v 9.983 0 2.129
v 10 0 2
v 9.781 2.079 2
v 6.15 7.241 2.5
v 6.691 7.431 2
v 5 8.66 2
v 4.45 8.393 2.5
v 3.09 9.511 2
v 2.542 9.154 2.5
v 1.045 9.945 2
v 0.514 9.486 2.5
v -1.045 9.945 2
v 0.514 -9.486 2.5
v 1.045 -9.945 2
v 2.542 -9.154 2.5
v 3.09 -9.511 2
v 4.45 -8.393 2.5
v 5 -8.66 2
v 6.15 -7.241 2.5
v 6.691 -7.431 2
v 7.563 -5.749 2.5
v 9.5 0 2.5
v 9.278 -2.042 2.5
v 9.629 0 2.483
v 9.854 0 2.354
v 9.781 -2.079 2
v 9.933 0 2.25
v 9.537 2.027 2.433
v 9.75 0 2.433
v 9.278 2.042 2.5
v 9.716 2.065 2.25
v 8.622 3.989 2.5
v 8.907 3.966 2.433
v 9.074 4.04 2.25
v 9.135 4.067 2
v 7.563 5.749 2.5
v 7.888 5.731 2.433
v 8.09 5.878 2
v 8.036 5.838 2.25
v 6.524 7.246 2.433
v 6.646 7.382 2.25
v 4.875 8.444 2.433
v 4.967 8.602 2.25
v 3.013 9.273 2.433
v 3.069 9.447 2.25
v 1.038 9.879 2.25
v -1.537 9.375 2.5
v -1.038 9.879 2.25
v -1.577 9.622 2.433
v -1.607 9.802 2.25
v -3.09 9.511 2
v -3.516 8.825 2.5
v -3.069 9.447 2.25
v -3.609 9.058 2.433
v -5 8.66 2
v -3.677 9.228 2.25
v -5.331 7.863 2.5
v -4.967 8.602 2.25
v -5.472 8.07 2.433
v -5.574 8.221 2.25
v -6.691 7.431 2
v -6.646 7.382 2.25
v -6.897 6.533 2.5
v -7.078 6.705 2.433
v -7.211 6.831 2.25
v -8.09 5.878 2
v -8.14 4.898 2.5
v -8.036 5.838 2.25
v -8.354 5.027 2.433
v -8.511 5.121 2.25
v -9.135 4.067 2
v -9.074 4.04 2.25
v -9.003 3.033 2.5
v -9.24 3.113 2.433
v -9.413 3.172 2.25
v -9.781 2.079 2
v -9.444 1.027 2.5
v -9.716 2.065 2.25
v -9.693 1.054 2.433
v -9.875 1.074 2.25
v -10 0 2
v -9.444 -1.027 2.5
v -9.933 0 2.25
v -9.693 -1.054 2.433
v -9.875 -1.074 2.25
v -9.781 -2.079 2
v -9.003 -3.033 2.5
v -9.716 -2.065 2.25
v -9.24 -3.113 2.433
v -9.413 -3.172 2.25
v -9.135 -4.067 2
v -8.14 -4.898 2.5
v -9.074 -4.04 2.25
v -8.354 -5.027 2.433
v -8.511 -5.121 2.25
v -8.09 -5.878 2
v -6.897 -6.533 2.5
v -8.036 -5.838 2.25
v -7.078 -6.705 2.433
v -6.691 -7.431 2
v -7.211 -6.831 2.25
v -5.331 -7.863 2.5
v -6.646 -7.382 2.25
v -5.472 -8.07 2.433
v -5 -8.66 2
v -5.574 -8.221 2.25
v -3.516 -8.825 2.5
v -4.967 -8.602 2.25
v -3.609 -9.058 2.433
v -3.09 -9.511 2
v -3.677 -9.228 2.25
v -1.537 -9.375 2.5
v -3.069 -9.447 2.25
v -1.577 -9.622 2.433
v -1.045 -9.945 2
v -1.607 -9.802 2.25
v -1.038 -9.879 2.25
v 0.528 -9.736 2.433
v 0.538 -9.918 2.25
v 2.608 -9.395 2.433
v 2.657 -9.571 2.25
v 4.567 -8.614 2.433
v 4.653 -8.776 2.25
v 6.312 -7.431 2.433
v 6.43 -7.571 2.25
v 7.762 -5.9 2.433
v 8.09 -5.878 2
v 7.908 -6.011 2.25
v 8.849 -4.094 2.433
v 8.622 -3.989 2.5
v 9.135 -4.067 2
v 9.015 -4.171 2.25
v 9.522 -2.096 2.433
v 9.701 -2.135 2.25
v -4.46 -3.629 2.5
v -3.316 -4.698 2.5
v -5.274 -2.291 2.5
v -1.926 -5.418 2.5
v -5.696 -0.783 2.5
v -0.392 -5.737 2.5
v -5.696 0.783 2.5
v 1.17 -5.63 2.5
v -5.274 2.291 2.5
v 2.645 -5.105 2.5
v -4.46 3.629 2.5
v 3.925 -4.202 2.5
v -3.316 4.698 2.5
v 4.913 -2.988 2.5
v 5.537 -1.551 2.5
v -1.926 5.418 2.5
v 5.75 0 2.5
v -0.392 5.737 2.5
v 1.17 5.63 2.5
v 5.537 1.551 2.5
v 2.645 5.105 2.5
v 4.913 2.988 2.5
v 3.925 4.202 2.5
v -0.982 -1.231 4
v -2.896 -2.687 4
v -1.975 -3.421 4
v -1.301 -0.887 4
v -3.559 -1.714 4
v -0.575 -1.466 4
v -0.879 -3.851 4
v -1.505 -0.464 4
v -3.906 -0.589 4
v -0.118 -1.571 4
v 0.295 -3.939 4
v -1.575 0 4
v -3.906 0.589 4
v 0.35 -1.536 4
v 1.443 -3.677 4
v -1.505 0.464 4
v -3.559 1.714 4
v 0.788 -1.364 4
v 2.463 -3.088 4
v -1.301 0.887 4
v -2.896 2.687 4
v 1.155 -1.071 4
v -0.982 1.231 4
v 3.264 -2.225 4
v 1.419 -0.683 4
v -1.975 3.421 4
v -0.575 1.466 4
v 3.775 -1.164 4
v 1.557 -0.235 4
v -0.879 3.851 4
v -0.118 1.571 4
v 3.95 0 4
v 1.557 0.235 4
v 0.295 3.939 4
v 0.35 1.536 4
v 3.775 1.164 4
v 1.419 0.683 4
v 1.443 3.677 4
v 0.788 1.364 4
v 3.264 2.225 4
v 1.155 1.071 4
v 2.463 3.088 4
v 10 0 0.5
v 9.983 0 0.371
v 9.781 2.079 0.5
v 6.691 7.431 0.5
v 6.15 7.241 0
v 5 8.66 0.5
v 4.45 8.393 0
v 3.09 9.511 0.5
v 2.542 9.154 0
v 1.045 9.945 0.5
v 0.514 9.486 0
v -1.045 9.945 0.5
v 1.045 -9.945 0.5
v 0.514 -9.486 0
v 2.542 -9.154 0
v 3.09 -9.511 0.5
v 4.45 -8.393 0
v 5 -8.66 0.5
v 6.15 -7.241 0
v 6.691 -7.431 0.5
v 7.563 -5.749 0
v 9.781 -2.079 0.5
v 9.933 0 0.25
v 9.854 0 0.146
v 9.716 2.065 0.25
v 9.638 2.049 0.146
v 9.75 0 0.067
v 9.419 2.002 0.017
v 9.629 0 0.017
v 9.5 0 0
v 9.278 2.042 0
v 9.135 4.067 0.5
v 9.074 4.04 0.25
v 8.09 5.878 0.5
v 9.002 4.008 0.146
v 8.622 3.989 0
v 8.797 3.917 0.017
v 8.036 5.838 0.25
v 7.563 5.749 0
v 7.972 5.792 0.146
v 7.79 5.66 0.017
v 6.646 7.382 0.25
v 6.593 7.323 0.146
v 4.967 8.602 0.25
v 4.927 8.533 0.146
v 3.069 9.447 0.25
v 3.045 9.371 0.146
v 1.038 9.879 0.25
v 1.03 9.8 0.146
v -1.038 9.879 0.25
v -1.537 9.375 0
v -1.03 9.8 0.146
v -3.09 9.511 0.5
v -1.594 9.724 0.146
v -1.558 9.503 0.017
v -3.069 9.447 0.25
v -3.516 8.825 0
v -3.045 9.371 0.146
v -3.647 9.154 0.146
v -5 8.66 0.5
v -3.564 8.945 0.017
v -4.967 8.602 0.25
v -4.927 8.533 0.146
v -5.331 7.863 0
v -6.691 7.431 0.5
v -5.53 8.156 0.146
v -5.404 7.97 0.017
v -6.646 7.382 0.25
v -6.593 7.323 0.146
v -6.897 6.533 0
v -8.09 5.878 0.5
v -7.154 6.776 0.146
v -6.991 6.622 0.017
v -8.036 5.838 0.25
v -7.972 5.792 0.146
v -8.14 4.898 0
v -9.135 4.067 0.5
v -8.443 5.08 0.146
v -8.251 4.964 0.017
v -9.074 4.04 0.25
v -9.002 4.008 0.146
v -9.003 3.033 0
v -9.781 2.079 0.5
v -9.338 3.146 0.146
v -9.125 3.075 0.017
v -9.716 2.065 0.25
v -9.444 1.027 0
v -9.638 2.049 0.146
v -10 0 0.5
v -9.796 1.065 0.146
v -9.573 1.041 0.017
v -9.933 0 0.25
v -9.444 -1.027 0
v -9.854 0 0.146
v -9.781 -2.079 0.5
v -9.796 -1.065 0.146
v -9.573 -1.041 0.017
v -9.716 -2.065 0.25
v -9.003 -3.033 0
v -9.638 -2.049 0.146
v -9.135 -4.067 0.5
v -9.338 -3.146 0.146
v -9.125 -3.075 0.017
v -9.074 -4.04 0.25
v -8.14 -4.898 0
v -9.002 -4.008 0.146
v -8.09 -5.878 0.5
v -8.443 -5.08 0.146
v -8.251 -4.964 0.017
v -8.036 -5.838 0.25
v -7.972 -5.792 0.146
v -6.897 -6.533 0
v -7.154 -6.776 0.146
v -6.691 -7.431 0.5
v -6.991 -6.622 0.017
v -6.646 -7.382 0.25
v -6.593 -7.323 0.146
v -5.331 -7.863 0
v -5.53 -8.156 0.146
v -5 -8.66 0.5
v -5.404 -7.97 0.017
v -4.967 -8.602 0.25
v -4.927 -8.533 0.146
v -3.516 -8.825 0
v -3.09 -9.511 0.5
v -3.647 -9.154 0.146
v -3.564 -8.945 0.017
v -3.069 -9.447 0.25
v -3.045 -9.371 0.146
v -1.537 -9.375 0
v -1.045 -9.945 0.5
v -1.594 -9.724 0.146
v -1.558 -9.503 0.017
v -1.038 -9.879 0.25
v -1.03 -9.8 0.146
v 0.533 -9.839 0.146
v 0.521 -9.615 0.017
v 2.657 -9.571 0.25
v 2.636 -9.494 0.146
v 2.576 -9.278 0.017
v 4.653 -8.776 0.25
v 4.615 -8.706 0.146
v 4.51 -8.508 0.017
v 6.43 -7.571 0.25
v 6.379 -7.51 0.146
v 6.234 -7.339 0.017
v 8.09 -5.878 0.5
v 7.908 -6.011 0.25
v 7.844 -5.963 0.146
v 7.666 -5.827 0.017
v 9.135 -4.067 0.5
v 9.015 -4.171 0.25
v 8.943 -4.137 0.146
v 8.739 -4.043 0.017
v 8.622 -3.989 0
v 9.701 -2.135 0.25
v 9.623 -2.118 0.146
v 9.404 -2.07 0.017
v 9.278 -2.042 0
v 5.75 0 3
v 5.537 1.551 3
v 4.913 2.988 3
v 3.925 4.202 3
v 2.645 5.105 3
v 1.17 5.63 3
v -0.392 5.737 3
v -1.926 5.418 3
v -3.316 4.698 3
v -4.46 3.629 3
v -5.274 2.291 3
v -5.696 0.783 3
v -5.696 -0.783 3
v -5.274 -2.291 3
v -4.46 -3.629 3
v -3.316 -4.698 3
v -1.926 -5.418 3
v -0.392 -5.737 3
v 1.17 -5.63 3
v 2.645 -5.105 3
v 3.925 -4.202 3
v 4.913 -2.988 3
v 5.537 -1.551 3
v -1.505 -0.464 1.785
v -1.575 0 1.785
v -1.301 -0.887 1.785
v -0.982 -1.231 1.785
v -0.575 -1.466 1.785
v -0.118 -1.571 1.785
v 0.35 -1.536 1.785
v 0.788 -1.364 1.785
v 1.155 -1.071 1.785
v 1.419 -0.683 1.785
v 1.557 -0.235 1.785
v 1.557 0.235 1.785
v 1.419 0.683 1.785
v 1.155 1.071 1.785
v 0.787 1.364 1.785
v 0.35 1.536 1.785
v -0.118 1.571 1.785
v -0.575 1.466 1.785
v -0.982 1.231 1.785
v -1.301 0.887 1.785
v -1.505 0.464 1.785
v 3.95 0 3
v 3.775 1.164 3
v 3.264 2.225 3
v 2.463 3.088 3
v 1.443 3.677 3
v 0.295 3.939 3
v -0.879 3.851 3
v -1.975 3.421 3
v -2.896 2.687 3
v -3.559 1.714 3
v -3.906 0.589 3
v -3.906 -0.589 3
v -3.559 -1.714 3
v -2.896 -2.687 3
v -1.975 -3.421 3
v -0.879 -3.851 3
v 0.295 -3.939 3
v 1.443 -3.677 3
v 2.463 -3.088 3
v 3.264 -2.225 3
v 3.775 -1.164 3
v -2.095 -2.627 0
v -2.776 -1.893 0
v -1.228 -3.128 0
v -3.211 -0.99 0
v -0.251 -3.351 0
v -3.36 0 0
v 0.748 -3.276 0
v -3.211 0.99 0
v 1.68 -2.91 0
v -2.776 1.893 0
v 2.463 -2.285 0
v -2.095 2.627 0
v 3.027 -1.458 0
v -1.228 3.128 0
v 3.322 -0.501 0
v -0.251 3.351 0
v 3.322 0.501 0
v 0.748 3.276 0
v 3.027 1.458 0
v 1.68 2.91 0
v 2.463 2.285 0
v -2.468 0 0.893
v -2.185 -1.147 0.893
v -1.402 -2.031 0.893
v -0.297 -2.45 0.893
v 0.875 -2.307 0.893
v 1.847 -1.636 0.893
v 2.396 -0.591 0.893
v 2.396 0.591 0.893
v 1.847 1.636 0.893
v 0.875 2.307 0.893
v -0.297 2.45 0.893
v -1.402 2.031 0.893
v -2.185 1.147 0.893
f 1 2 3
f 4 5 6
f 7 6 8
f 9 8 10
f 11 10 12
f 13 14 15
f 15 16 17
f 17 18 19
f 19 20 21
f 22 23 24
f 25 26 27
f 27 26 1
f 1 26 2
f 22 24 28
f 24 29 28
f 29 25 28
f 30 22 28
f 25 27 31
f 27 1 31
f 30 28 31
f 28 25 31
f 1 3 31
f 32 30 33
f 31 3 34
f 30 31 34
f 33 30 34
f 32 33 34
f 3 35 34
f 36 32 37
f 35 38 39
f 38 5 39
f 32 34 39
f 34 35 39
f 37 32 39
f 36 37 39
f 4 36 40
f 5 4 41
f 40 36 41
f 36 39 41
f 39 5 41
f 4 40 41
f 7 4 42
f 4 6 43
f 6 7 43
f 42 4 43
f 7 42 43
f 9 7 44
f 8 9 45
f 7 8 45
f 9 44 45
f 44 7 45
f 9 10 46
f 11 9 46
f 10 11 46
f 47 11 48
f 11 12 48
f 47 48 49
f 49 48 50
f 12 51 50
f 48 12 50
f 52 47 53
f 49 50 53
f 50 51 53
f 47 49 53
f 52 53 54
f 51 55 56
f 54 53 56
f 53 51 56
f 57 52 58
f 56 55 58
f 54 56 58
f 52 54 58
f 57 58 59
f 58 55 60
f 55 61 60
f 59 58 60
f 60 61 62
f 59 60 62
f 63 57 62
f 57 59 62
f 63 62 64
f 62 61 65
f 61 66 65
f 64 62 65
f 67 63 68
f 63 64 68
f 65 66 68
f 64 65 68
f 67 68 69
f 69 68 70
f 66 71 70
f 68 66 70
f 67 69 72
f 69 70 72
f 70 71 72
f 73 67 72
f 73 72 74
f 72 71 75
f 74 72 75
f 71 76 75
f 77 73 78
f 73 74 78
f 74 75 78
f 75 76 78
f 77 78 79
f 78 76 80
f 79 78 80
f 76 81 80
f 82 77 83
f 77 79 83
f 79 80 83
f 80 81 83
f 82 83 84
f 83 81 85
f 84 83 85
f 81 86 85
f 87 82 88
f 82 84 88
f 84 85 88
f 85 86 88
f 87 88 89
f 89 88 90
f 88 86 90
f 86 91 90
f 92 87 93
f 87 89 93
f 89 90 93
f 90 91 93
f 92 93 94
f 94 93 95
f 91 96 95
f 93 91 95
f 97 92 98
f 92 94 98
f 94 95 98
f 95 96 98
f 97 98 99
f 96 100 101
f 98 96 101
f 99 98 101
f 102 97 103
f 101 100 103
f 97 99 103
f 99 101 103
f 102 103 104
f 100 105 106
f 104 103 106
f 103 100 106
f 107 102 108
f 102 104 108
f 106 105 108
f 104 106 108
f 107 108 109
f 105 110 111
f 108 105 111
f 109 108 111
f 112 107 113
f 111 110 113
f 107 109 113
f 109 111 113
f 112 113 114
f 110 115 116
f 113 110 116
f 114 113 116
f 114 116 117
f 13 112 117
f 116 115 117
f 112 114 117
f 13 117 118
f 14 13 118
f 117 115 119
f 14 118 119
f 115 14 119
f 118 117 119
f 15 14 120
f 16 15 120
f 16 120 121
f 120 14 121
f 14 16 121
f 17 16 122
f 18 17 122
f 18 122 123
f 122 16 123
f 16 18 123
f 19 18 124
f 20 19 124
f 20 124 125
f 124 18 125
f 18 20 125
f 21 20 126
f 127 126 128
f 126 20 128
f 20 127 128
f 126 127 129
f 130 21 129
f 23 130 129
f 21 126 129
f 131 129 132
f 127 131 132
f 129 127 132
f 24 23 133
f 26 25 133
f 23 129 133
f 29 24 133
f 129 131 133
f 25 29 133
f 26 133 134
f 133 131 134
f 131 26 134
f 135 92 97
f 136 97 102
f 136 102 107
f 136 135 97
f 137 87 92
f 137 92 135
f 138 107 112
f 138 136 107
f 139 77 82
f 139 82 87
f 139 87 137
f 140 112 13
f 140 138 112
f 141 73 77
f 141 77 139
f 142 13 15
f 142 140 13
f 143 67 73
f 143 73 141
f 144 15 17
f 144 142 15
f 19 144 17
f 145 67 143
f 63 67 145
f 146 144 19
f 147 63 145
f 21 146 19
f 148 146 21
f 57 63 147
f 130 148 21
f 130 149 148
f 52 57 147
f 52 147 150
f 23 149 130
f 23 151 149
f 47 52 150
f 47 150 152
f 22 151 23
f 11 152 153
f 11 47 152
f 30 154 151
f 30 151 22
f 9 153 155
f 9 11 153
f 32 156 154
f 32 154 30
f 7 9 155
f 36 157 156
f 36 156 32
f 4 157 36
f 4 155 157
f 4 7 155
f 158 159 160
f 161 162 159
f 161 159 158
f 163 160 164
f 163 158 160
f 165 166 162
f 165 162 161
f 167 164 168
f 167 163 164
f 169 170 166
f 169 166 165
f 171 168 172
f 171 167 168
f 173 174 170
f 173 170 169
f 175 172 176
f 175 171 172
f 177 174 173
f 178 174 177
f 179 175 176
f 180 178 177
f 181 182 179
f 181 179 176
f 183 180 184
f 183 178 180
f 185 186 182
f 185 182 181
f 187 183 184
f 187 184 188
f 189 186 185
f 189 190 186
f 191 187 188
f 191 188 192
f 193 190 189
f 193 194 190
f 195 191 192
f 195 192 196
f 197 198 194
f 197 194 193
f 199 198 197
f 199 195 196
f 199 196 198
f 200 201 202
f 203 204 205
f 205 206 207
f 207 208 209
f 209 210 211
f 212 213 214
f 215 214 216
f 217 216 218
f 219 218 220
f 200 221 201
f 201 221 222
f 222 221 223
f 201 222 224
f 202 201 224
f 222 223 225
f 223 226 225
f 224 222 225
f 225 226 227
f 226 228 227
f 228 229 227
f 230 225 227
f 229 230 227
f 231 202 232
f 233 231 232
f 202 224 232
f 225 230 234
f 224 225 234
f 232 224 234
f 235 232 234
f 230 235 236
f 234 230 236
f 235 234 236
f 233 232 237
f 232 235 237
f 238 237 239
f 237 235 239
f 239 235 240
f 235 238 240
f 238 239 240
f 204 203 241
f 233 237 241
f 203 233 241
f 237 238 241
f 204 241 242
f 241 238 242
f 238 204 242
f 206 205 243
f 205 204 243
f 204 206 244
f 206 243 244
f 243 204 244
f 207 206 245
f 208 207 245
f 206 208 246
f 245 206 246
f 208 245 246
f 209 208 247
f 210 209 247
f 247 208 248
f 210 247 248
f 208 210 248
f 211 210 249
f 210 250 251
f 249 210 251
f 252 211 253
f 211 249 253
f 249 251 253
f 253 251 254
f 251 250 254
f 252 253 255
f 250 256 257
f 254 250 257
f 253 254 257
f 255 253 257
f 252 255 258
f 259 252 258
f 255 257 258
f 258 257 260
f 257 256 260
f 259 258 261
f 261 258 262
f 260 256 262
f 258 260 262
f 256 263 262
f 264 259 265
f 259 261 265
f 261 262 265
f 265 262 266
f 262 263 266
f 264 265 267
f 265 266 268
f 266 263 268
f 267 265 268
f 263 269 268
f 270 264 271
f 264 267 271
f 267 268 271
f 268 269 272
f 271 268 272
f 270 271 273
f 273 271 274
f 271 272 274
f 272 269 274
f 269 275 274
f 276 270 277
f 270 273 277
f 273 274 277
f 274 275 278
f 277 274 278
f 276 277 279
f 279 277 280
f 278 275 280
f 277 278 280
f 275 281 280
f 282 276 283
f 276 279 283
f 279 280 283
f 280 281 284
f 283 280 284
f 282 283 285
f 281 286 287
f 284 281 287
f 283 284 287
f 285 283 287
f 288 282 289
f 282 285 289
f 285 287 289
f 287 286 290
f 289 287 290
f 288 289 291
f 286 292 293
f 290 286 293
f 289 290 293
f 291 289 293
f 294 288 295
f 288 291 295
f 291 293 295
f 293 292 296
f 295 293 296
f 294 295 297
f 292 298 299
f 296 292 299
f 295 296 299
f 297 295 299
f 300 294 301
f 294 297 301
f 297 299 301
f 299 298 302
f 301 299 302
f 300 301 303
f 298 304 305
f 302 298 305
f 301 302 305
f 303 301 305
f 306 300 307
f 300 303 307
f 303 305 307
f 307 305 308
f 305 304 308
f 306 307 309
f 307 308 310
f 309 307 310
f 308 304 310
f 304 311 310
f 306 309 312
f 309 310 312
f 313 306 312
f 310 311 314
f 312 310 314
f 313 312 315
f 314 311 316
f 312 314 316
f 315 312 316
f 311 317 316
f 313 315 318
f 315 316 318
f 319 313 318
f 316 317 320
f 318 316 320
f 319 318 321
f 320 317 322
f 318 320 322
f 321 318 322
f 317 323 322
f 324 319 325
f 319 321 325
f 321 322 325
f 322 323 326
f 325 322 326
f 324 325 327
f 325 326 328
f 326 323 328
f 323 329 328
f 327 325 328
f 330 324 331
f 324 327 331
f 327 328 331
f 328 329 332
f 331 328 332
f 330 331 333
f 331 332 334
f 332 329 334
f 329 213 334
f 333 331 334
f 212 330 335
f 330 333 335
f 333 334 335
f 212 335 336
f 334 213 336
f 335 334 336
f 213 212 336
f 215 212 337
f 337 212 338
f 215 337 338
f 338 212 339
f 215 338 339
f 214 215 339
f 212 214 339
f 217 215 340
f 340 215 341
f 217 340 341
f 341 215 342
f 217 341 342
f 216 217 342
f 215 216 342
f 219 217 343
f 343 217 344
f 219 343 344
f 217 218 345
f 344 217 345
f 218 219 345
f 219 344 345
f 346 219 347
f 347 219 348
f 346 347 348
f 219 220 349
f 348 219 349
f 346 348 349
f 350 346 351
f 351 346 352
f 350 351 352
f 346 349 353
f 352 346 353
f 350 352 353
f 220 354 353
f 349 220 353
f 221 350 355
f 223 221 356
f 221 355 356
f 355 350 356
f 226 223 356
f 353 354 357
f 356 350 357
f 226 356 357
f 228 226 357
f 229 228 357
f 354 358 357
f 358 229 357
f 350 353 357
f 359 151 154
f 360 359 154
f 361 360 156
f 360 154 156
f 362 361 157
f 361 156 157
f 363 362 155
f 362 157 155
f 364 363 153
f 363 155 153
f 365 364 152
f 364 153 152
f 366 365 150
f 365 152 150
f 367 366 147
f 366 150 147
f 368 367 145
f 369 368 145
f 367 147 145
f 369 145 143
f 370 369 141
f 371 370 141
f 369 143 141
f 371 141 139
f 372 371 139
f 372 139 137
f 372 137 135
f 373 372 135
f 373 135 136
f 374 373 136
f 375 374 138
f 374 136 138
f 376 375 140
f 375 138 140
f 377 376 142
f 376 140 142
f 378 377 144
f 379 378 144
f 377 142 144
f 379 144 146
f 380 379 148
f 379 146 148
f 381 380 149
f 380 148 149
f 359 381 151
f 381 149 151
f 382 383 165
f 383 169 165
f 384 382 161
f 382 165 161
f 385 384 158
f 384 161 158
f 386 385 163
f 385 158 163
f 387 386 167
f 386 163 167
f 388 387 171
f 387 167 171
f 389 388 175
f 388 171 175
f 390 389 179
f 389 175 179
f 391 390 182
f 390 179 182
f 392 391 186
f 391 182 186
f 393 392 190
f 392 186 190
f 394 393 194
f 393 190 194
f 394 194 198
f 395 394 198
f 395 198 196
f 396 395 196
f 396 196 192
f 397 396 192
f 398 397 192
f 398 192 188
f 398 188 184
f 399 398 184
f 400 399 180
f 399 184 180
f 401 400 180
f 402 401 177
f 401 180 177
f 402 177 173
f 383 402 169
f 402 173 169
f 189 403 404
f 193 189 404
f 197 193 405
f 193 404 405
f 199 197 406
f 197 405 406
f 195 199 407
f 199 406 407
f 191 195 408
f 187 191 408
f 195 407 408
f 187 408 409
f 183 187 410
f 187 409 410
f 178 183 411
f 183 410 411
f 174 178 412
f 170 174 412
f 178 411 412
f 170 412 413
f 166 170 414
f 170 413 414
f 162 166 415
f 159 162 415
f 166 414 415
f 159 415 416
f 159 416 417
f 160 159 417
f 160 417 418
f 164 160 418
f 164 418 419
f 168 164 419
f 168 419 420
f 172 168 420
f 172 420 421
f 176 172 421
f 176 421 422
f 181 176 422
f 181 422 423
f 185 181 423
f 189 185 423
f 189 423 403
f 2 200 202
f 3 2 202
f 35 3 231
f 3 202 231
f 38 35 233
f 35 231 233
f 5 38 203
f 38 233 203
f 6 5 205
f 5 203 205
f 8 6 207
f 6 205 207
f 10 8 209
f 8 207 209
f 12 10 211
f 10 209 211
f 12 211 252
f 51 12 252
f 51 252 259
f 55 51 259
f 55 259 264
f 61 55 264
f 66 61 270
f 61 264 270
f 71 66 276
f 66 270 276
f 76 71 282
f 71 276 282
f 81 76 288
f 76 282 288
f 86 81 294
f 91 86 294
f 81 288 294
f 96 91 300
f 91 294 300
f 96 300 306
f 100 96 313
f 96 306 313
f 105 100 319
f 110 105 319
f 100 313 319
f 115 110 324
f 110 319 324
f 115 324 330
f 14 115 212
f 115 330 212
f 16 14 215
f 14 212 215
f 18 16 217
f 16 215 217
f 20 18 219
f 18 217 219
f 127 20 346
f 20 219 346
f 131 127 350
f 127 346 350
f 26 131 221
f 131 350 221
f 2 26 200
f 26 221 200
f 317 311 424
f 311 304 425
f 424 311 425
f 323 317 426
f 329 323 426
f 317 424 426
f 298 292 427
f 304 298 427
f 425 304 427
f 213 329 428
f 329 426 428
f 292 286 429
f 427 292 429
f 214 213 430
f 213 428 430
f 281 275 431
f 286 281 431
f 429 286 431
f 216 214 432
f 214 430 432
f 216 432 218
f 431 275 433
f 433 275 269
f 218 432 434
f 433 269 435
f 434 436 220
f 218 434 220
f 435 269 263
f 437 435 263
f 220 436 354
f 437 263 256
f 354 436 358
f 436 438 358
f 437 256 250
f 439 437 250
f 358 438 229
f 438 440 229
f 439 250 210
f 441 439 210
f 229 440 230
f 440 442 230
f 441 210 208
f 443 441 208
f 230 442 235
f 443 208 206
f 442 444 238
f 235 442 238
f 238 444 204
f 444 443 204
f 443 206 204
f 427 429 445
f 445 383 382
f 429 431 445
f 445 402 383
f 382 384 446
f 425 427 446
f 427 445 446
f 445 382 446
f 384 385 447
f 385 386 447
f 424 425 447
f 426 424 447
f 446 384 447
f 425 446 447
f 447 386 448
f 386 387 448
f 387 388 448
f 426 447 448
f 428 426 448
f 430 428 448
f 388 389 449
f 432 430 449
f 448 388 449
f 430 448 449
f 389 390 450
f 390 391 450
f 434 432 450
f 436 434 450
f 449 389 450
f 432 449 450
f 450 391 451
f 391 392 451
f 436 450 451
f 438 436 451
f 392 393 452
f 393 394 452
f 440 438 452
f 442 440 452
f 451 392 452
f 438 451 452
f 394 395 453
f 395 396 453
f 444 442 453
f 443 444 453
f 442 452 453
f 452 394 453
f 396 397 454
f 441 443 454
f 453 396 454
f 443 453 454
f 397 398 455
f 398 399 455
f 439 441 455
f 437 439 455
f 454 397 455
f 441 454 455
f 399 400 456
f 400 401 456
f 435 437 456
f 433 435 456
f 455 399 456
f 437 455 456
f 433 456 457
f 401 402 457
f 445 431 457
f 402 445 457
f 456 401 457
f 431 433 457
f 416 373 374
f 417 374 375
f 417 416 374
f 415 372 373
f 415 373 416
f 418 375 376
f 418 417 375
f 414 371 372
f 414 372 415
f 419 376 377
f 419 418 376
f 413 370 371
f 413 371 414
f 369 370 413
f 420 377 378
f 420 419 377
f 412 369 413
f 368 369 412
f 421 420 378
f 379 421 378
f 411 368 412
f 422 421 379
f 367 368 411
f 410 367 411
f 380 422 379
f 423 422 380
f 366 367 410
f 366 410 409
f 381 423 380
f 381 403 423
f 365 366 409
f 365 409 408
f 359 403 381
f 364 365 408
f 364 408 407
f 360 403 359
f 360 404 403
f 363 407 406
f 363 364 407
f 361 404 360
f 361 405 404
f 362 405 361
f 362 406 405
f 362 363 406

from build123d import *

# Parameters (mm, degrees)
F0_R           = 10
F1_DEPTH       = 2.5
F2_R           = 3.95
F3_DEPTH       = 1.5
F2_R_2         = 5.75
F4_DEPTH       = 0.5
F5_R           = 0.5
F6_D           = 3.15
F6_CSINK_D     = 6.72
F6_CSINK_ANGLE = 90


with BuildPart() as f1:
    # F0 (on Top) → F1 (new body)
    with BuildSketch(Plane.XY):
        Circle(F0_R)
    extrude(amount=F1_DEPTH)

    # F2 (on face) → F3 (join)
    with BuildSketch(Plane.XY.offset(2.5)):
        Circle(F2_R)
    extrude(amount=F3_DEPTH)

    # F2 (on face) → F4 (join)
    with BuildSketch(Plane.XY.offset(2.5)):
        Circle(F2_R_2)
        Circle(F2_R, mode=Mode.SUBTRACT)
    extrude(amount=F4_DEPTH)

    # F5
    f5_edges = [f1.edges().sort_by_distance(p)[0] for p in [
        (-10, 0, 0),
        (-10, 0, 2.5),
    ]]
    fillet(f5_edges, radius=F5_R)

    # F6 (through all)
    with Locations(Plane(origin=(0, 0, 0), x_dir=(1, 0, 0), z_dir=(0, 0, -1))):
        with Locations((0, 0)):
            CounterSinkHole(F6_D / 2, F6_CSINK_D / 2, counter_sink_angle=F6_CSINK_ANGLE)


solid = f1.part
